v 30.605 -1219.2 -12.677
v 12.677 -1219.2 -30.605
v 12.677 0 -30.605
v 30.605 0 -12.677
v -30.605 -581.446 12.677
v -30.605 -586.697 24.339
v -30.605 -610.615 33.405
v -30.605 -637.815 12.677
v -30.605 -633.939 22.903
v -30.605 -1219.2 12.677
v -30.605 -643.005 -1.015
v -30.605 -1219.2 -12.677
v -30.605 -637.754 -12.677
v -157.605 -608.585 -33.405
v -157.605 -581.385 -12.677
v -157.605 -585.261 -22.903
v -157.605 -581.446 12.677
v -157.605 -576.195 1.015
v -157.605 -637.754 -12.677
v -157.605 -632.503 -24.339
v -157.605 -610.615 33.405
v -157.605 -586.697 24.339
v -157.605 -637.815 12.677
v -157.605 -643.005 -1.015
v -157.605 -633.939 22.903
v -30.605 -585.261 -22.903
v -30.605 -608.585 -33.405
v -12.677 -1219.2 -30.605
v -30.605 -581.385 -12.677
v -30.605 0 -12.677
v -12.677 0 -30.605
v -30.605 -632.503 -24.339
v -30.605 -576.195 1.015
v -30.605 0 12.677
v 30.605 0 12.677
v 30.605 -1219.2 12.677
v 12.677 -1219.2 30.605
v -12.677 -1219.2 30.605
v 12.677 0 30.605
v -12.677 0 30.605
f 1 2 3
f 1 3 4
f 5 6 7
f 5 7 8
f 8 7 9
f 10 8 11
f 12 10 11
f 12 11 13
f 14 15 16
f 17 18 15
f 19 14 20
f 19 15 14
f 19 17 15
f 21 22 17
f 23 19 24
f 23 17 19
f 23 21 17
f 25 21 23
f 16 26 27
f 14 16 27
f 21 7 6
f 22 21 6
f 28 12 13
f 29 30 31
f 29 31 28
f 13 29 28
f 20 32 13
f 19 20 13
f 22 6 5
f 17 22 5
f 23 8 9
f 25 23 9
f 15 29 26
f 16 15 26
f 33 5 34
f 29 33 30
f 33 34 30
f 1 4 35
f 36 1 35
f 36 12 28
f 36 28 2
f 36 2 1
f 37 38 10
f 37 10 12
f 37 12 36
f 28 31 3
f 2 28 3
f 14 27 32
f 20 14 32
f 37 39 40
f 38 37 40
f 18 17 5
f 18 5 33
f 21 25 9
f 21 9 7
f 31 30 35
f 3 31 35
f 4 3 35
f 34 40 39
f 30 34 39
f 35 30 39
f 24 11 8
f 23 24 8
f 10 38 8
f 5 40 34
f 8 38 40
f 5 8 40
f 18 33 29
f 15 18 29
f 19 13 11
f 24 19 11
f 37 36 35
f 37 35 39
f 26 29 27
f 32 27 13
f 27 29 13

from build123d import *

# Parameters (mm, degrees)
F1_DEPTH = 1219.2
F3_DEPTH = 127


with BuildPart() as f1:
    # F0 (on Front) → F1 (new body)
    with BuildSketch(Plane.XZ):
        Polygon((30.604916, -12.676971), (30.604916, 12.676971), (12.676971, 30.604916), (-12.676971, 30.604916), (-30.604916, 12.676971), (-30.604916, -12.676971), (-12.676971, -30.604916), (12.676971, -30.604916), align=None)
    extrude(amount=F1_DEPTH)

    # F2 (on face) → F3 (join)
    with BuildSketch(Plane(origin=(-30.604916, 0, 0), x_dir=(0, -1, 0), z_dir=(-1, 0, 0))):
        Polygon((581.44556, 12.676971), (637.815356, 12.676971), (633.938922, 22.903467), (610.61502, 33.405414), (586.696533, 24.338922), align=None)
        Polygon((637.75444, -12.676971), (643.005414, -1.01502), (637.815356, 12.676971), (581.44556, 12.676971), (576.194586, 1.01502), (581.384644, -12.676971), align=None)
        Polygon((632.503467, -24.338922), (637.75444, -12.676971), (581.384644, -12.676971), (585.261078, -22.903467), (608.58498, -33.405414), align=None)
    extrude(amount=F3_DEPTH)


solid = f1.part
